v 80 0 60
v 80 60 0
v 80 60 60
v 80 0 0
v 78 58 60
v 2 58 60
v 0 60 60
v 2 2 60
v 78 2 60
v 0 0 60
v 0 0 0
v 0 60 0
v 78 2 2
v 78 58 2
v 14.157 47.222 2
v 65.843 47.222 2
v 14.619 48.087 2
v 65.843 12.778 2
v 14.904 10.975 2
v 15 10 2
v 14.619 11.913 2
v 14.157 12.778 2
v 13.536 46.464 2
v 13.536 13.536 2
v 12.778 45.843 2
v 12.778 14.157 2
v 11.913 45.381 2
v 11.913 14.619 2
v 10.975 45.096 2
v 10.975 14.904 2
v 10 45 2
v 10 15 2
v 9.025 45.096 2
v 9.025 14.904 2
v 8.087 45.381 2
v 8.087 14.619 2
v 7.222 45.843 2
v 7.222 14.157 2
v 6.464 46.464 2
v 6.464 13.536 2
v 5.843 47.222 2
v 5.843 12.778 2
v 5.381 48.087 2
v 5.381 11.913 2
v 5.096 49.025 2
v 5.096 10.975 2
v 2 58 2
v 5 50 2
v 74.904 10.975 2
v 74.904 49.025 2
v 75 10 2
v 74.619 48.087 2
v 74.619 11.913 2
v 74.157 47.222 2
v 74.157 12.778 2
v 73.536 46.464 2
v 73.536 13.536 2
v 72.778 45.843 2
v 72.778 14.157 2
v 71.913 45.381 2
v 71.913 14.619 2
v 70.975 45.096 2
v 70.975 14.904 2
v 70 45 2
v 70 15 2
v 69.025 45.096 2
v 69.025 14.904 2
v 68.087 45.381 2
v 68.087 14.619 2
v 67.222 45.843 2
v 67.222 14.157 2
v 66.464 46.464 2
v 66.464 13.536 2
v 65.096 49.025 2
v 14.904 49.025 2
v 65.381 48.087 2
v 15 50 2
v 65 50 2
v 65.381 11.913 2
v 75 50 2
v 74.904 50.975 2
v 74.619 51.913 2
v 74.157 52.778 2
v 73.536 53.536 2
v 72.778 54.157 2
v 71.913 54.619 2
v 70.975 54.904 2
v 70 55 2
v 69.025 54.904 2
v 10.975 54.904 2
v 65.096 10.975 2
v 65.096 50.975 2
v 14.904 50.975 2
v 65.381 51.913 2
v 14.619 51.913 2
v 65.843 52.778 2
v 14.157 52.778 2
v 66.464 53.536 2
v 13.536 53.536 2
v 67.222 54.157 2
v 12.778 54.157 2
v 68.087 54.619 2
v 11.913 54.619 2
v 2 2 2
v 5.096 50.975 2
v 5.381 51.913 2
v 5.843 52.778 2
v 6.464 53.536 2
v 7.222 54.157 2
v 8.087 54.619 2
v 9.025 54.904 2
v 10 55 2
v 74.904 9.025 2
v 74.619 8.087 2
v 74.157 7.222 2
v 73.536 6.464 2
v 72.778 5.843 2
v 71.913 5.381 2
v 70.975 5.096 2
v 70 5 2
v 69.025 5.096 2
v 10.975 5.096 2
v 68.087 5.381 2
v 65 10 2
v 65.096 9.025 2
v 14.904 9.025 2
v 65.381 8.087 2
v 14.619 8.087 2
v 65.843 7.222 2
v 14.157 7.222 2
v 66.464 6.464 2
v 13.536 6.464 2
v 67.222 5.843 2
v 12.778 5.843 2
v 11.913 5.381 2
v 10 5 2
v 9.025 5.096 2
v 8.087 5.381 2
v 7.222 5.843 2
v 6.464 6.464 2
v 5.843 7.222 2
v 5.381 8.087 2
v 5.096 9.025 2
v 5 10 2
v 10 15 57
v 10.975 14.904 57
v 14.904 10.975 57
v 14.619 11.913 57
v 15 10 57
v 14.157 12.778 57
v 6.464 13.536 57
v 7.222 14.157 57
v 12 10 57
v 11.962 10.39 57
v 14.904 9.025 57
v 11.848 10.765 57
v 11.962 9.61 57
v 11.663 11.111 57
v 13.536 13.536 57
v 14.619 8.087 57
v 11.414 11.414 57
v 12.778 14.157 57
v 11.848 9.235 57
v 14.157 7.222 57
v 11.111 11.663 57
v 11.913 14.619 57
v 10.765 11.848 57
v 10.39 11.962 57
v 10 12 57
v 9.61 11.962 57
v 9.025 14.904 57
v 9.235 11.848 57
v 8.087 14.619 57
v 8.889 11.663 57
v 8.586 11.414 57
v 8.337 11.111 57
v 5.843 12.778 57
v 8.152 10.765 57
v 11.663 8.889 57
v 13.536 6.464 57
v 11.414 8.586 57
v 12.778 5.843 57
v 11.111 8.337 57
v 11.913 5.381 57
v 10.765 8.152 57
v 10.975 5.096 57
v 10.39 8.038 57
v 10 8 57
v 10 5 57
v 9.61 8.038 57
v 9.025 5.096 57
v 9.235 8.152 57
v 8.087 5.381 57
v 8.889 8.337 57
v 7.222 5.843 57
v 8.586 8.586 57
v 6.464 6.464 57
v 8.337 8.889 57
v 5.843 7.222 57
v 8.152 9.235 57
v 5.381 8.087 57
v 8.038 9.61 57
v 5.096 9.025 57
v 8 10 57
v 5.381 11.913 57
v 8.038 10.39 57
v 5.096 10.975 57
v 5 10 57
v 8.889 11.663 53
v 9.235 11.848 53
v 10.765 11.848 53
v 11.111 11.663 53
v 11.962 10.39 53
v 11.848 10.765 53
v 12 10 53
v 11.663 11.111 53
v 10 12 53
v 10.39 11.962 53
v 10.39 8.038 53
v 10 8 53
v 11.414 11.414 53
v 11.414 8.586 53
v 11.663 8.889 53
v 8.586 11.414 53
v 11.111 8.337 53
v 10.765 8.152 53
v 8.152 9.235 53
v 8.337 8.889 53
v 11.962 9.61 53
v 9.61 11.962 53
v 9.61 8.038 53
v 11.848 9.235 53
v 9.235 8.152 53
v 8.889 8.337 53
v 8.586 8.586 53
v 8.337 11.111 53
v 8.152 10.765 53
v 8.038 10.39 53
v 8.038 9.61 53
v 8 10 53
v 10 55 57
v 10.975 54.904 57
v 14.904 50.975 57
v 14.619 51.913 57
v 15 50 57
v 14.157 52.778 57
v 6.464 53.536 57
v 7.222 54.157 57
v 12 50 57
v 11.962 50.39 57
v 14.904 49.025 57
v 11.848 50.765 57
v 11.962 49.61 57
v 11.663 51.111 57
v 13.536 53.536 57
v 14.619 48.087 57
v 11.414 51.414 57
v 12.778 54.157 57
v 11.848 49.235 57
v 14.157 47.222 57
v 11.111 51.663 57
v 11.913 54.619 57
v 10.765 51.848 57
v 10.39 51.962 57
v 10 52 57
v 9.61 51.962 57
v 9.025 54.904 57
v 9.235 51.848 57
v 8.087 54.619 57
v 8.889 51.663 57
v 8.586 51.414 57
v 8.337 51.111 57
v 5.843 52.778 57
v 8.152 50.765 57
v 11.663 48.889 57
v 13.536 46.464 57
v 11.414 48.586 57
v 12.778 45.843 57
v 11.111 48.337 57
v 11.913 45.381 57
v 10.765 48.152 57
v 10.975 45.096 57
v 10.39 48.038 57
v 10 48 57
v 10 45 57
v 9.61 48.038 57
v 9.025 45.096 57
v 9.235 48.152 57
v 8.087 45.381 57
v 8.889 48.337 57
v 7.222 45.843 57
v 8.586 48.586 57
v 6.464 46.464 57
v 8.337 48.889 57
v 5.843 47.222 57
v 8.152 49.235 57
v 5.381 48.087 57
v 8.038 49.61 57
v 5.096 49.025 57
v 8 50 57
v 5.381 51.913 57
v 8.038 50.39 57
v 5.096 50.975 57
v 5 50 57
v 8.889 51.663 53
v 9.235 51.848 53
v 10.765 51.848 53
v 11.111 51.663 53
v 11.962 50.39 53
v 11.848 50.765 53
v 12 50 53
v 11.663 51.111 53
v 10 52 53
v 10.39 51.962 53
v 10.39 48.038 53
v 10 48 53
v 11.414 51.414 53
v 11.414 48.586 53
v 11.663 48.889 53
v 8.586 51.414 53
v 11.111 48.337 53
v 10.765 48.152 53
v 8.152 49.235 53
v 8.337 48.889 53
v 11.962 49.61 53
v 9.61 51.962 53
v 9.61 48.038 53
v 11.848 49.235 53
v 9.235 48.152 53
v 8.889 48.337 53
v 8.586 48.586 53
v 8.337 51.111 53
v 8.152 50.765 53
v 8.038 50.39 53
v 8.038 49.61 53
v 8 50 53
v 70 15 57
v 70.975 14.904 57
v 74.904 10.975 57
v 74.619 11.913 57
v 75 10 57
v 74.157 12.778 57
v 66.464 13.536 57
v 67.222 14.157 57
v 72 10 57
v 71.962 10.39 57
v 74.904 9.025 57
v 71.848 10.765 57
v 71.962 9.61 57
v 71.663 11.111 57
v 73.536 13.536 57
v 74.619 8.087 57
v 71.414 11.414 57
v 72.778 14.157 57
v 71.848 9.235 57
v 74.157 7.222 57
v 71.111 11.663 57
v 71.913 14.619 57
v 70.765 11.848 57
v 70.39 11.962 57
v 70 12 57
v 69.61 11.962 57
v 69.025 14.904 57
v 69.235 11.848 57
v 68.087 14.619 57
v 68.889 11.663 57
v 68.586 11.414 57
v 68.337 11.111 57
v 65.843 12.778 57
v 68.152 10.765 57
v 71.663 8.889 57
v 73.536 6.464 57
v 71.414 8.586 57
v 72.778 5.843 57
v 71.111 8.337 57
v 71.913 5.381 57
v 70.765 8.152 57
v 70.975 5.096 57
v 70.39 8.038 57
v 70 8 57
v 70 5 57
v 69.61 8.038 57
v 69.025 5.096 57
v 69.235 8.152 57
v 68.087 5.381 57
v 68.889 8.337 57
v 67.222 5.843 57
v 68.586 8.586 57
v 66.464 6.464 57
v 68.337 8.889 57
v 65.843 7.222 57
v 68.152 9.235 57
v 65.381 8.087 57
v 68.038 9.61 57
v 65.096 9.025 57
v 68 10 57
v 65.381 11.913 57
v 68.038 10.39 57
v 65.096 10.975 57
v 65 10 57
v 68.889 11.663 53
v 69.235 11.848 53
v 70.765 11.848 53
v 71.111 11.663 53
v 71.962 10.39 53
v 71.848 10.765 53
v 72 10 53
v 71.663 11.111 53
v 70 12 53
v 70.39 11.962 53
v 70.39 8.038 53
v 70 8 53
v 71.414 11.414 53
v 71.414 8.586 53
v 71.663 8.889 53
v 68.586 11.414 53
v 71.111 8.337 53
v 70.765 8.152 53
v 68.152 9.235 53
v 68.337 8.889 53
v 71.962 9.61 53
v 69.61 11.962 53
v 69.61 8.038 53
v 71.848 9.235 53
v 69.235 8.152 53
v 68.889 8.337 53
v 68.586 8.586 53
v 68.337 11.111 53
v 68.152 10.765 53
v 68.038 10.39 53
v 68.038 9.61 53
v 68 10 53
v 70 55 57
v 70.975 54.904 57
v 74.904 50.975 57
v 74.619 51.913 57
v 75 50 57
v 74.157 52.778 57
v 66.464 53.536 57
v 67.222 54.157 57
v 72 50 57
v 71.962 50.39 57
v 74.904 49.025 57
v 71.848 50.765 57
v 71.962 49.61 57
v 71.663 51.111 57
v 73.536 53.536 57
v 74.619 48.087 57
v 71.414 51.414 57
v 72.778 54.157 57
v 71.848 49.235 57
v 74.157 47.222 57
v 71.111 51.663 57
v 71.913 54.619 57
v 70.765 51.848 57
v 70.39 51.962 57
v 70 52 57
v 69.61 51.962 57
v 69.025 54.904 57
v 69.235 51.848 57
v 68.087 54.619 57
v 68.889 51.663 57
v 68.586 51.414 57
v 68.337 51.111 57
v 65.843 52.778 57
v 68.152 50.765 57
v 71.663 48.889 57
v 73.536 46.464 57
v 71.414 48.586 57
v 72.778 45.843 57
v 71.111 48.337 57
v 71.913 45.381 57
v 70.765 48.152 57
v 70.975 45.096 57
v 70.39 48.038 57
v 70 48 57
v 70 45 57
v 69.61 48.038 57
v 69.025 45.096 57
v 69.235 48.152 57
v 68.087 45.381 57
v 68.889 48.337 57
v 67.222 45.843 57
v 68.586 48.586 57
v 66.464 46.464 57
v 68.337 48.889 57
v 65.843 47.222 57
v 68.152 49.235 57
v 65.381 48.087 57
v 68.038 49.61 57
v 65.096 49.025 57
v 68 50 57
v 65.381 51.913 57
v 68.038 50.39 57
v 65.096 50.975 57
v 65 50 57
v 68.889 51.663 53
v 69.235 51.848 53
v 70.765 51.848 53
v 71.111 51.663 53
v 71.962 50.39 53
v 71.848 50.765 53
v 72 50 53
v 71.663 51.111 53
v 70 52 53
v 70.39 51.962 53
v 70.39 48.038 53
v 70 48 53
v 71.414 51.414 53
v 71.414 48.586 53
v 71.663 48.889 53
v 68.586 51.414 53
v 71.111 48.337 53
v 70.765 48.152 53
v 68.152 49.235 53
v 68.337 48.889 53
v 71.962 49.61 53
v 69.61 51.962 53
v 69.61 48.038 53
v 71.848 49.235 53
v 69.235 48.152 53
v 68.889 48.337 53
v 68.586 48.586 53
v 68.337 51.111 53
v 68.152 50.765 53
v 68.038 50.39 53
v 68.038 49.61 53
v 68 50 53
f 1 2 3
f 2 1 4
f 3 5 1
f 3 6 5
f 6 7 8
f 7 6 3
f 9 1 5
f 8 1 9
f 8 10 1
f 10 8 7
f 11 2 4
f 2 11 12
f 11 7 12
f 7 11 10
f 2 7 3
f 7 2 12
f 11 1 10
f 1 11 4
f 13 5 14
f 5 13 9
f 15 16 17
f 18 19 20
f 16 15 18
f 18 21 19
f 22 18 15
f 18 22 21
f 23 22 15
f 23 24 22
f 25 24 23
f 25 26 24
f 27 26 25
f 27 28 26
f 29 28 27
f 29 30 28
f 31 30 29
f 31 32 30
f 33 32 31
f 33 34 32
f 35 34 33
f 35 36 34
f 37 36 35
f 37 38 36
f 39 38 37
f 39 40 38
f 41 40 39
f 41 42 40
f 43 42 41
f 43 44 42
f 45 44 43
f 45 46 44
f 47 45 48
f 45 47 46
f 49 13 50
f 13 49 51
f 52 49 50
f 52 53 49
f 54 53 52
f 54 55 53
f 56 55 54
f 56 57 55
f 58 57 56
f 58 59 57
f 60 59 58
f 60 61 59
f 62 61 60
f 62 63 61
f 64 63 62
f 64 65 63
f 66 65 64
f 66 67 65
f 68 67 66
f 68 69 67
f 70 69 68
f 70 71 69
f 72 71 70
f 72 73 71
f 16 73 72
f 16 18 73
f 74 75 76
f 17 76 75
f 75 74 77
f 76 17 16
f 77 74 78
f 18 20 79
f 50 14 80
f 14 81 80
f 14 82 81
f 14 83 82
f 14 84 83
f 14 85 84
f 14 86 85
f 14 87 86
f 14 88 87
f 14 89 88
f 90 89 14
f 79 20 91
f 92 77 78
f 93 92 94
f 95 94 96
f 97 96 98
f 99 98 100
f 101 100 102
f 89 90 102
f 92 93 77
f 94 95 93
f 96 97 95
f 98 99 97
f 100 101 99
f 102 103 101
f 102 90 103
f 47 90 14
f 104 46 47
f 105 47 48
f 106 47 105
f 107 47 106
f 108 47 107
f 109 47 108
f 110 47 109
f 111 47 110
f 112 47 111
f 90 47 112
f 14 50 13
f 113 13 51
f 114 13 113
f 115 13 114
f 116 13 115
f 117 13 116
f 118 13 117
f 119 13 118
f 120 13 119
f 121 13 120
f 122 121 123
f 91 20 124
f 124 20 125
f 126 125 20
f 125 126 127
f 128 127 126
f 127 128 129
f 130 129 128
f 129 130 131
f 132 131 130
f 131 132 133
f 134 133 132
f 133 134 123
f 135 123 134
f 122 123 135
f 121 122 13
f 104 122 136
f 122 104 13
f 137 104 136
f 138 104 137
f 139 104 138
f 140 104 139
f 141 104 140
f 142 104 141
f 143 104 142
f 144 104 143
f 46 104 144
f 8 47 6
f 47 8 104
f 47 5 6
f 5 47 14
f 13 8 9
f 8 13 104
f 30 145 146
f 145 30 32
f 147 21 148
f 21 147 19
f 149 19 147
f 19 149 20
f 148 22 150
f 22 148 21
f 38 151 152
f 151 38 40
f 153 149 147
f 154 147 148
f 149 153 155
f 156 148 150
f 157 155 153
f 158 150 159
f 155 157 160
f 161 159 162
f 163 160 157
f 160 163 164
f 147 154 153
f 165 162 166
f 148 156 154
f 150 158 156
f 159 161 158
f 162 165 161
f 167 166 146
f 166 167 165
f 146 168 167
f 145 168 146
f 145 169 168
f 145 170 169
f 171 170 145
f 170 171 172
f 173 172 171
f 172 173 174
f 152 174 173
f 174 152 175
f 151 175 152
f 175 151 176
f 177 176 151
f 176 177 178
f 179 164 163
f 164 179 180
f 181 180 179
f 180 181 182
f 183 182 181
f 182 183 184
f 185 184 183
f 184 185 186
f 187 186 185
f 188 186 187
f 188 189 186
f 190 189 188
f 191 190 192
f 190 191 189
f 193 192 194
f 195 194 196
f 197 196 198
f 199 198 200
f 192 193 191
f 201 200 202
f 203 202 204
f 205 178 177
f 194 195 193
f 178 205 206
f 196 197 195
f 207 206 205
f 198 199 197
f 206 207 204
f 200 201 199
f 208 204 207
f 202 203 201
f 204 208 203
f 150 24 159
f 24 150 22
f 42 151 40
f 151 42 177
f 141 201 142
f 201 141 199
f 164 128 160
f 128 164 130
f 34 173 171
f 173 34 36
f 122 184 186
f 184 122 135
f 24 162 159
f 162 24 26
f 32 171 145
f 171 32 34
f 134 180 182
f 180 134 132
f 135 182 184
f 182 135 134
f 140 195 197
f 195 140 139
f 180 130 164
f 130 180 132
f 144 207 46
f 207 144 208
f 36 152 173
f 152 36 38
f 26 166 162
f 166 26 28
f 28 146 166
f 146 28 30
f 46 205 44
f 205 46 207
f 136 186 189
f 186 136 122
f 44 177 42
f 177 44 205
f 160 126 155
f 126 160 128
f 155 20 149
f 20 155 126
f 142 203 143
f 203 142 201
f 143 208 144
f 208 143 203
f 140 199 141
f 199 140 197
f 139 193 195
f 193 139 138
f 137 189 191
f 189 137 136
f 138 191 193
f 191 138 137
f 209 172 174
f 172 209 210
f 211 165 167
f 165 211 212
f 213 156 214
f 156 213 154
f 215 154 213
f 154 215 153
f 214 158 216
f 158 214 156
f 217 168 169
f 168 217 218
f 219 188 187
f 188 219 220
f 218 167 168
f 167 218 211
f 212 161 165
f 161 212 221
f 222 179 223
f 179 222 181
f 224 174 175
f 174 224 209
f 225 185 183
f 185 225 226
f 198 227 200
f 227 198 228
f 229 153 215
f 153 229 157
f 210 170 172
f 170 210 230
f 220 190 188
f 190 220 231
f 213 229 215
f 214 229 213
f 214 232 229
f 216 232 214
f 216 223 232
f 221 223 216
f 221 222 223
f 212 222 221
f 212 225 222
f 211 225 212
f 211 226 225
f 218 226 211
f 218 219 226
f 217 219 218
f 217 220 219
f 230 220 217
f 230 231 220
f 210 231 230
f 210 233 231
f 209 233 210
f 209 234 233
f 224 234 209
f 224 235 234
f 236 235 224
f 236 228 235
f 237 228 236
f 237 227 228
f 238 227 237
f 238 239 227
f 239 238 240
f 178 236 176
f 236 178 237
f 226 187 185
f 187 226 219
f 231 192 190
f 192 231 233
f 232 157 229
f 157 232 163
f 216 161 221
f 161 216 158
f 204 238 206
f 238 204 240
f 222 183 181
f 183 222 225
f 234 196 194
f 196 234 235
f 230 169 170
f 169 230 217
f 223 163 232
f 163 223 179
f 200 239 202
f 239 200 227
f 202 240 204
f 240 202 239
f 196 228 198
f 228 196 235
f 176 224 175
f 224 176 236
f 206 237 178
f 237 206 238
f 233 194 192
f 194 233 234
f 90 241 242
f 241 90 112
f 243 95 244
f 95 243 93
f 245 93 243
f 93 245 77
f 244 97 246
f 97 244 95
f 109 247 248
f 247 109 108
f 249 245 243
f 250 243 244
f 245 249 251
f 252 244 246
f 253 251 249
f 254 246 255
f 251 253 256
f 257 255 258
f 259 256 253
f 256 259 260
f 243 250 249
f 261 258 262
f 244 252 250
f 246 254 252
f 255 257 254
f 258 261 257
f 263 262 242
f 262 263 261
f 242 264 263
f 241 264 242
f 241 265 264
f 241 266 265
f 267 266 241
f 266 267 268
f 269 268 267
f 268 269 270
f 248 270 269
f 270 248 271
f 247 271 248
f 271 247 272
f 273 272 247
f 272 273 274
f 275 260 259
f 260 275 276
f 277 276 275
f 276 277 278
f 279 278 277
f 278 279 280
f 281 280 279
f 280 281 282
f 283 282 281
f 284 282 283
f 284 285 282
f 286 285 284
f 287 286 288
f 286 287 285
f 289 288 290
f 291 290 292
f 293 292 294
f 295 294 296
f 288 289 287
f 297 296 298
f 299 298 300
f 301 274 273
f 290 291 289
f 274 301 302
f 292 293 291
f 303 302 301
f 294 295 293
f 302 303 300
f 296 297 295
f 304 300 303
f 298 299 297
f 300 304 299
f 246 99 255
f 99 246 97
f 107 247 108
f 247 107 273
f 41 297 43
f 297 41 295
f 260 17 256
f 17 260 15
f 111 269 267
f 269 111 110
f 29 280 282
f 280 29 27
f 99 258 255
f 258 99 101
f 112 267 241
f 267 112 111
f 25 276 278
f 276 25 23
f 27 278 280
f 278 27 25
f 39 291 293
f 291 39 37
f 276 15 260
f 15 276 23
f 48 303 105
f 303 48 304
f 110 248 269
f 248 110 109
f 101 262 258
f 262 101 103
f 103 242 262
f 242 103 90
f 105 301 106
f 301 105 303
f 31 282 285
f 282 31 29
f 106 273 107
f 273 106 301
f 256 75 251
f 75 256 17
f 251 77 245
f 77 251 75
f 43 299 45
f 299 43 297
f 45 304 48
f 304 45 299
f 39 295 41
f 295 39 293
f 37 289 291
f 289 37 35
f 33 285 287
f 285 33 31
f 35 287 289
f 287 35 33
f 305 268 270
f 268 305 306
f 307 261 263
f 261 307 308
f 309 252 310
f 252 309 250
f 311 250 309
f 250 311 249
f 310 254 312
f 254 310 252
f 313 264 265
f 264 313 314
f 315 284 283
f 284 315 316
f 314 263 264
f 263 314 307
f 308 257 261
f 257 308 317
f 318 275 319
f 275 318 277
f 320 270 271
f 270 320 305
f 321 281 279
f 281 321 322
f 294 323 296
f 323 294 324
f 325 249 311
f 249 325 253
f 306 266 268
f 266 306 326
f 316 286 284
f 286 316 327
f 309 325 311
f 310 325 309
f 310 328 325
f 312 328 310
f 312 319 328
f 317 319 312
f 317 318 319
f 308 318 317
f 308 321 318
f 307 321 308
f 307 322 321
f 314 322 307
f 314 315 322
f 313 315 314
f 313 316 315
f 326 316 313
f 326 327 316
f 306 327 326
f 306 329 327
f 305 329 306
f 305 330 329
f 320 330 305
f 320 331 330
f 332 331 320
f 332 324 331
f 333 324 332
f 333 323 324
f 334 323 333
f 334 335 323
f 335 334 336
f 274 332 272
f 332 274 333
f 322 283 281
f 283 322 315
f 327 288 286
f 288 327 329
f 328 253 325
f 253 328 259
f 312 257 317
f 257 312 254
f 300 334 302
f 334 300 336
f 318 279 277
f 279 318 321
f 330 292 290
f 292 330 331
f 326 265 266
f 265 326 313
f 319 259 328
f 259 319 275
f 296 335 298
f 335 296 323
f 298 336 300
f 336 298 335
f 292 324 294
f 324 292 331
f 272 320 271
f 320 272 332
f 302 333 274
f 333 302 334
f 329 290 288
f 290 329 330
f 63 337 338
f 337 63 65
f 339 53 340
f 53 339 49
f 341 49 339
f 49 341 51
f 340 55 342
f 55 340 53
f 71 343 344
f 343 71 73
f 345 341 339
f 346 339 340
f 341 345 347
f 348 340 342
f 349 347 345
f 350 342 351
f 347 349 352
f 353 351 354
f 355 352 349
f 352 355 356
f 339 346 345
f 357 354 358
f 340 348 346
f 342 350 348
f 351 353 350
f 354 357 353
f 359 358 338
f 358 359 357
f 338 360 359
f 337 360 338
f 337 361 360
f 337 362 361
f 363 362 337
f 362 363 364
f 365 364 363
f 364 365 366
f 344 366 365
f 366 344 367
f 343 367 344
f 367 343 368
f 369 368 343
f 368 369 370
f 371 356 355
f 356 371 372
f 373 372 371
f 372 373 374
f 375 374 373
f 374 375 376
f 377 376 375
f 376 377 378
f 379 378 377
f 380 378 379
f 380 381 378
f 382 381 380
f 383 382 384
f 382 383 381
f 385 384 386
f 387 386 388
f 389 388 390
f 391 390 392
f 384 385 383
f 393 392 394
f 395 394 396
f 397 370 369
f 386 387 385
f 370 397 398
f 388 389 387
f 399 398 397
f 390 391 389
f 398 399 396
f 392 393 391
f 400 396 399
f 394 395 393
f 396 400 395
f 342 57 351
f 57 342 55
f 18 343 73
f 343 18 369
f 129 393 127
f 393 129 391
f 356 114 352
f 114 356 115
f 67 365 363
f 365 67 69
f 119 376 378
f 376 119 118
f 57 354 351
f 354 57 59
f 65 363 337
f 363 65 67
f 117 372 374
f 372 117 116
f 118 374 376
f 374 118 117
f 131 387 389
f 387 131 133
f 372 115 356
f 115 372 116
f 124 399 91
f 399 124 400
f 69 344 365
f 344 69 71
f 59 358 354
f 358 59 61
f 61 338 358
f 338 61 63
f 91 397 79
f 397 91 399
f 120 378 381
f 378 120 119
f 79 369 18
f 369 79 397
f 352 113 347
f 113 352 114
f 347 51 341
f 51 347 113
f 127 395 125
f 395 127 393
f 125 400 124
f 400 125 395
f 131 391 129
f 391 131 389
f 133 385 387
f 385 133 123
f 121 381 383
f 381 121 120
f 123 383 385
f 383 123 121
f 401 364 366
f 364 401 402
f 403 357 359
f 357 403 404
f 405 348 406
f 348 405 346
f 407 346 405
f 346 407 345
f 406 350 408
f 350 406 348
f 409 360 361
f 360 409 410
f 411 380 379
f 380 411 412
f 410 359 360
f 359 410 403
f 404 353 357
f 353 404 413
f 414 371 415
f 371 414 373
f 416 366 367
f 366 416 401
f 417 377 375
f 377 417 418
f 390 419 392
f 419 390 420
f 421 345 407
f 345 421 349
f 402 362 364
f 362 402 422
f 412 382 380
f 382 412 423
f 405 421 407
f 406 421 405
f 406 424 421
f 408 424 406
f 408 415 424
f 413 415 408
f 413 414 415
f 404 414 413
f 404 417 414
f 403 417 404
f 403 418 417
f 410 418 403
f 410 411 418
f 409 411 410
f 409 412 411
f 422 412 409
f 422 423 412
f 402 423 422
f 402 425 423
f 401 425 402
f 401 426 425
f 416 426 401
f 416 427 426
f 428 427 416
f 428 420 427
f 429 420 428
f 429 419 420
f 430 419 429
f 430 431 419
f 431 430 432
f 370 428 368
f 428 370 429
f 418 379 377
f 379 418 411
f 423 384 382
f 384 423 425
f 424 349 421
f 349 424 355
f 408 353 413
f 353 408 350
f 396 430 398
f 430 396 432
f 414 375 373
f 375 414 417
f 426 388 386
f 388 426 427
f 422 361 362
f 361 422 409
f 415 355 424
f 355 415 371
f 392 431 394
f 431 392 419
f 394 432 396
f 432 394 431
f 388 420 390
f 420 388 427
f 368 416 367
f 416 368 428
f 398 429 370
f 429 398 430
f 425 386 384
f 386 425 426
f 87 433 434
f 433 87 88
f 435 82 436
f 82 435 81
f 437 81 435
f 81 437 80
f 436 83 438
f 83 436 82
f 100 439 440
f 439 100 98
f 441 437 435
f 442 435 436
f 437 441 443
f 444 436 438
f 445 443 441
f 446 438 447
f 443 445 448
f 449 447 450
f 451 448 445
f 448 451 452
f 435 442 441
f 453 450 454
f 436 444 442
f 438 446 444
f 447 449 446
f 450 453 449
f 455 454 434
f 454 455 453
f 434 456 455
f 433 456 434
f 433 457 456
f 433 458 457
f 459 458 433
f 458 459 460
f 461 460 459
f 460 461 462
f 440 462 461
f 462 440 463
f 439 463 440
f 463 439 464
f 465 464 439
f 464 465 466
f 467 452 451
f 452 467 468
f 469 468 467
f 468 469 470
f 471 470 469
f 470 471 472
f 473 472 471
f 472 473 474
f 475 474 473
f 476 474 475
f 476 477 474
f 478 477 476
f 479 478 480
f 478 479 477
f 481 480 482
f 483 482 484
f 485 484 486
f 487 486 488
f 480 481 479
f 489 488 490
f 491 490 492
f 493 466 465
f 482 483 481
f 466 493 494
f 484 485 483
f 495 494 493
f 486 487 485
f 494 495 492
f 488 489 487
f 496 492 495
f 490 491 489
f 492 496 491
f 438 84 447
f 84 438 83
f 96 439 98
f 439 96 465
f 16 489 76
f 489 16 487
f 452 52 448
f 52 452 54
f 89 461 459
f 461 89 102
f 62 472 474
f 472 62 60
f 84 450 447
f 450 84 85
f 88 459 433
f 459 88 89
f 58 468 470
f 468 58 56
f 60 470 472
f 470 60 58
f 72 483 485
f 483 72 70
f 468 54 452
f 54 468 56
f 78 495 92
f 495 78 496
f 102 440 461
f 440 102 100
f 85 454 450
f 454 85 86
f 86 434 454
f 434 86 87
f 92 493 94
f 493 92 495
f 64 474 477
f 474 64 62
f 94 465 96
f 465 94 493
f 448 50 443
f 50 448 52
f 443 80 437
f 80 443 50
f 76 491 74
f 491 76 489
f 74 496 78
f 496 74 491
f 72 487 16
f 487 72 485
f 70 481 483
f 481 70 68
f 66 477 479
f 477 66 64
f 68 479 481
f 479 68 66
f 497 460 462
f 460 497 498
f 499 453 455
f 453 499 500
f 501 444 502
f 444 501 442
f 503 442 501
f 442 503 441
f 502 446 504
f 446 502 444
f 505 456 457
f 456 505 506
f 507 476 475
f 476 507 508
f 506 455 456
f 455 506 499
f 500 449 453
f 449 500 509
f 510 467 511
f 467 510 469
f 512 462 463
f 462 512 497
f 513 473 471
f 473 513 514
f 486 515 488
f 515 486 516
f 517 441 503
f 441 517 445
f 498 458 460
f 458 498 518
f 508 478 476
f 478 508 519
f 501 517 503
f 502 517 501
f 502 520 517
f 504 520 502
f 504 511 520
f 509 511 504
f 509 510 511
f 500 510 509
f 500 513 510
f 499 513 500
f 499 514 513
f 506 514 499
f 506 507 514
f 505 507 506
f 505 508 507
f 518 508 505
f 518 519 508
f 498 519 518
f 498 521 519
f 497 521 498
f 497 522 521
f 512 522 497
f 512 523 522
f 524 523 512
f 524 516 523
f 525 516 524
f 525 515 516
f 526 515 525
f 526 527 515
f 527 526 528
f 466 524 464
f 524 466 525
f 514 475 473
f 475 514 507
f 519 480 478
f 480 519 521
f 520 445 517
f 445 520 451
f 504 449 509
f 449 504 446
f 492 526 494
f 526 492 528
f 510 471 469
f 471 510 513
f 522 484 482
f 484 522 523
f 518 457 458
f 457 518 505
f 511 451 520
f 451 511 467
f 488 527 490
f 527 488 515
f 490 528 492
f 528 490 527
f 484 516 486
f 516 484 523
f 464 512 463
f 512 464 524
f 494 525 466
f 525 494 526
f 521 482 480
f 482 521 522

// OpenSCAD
$fn = 32;

// ----------------------------------------------------------------------
// Enclosure box: bosses enclosure
// ----------------------------------------------------------------------

// --- parameters (mm) ---
box_l = 80;               // outer length, X
box_w = 60;               // outer width, Y
box_h = 60;               // outer height
wall_t = 2;               // wall thickness
boss_r = 5;               // corner boss radius
hole_r = 2;               // boss screw hole radius
boss_in = 10;             // boss inset from the corners

inner_h = box_h - wall_t;  // cavity depth
boss_h = inner_h - 2;  // corner boss height

difference() {
  union() {
    difference() {
      cube([box_l, box_w, box_h]);
      translate([wall_t, wall_t, wall_t])
        cube([box_l - 2 * wall_t, box_w - 2 * wall_t, box_h]);
    }
    for (sx = [0, 1], sy = [0, 1])
      translate([sx ? box_l - boss_in : boss_in,
                 sy ? box_w - boss_in : boss_in, wall_t - 1])
        difference() {
          cylinder(r = boss_r, h = boss_h);
          translate([0, 0, boss_h - 4])
            cylinder(r = hole_r, h = 5);
        }
  }
}
